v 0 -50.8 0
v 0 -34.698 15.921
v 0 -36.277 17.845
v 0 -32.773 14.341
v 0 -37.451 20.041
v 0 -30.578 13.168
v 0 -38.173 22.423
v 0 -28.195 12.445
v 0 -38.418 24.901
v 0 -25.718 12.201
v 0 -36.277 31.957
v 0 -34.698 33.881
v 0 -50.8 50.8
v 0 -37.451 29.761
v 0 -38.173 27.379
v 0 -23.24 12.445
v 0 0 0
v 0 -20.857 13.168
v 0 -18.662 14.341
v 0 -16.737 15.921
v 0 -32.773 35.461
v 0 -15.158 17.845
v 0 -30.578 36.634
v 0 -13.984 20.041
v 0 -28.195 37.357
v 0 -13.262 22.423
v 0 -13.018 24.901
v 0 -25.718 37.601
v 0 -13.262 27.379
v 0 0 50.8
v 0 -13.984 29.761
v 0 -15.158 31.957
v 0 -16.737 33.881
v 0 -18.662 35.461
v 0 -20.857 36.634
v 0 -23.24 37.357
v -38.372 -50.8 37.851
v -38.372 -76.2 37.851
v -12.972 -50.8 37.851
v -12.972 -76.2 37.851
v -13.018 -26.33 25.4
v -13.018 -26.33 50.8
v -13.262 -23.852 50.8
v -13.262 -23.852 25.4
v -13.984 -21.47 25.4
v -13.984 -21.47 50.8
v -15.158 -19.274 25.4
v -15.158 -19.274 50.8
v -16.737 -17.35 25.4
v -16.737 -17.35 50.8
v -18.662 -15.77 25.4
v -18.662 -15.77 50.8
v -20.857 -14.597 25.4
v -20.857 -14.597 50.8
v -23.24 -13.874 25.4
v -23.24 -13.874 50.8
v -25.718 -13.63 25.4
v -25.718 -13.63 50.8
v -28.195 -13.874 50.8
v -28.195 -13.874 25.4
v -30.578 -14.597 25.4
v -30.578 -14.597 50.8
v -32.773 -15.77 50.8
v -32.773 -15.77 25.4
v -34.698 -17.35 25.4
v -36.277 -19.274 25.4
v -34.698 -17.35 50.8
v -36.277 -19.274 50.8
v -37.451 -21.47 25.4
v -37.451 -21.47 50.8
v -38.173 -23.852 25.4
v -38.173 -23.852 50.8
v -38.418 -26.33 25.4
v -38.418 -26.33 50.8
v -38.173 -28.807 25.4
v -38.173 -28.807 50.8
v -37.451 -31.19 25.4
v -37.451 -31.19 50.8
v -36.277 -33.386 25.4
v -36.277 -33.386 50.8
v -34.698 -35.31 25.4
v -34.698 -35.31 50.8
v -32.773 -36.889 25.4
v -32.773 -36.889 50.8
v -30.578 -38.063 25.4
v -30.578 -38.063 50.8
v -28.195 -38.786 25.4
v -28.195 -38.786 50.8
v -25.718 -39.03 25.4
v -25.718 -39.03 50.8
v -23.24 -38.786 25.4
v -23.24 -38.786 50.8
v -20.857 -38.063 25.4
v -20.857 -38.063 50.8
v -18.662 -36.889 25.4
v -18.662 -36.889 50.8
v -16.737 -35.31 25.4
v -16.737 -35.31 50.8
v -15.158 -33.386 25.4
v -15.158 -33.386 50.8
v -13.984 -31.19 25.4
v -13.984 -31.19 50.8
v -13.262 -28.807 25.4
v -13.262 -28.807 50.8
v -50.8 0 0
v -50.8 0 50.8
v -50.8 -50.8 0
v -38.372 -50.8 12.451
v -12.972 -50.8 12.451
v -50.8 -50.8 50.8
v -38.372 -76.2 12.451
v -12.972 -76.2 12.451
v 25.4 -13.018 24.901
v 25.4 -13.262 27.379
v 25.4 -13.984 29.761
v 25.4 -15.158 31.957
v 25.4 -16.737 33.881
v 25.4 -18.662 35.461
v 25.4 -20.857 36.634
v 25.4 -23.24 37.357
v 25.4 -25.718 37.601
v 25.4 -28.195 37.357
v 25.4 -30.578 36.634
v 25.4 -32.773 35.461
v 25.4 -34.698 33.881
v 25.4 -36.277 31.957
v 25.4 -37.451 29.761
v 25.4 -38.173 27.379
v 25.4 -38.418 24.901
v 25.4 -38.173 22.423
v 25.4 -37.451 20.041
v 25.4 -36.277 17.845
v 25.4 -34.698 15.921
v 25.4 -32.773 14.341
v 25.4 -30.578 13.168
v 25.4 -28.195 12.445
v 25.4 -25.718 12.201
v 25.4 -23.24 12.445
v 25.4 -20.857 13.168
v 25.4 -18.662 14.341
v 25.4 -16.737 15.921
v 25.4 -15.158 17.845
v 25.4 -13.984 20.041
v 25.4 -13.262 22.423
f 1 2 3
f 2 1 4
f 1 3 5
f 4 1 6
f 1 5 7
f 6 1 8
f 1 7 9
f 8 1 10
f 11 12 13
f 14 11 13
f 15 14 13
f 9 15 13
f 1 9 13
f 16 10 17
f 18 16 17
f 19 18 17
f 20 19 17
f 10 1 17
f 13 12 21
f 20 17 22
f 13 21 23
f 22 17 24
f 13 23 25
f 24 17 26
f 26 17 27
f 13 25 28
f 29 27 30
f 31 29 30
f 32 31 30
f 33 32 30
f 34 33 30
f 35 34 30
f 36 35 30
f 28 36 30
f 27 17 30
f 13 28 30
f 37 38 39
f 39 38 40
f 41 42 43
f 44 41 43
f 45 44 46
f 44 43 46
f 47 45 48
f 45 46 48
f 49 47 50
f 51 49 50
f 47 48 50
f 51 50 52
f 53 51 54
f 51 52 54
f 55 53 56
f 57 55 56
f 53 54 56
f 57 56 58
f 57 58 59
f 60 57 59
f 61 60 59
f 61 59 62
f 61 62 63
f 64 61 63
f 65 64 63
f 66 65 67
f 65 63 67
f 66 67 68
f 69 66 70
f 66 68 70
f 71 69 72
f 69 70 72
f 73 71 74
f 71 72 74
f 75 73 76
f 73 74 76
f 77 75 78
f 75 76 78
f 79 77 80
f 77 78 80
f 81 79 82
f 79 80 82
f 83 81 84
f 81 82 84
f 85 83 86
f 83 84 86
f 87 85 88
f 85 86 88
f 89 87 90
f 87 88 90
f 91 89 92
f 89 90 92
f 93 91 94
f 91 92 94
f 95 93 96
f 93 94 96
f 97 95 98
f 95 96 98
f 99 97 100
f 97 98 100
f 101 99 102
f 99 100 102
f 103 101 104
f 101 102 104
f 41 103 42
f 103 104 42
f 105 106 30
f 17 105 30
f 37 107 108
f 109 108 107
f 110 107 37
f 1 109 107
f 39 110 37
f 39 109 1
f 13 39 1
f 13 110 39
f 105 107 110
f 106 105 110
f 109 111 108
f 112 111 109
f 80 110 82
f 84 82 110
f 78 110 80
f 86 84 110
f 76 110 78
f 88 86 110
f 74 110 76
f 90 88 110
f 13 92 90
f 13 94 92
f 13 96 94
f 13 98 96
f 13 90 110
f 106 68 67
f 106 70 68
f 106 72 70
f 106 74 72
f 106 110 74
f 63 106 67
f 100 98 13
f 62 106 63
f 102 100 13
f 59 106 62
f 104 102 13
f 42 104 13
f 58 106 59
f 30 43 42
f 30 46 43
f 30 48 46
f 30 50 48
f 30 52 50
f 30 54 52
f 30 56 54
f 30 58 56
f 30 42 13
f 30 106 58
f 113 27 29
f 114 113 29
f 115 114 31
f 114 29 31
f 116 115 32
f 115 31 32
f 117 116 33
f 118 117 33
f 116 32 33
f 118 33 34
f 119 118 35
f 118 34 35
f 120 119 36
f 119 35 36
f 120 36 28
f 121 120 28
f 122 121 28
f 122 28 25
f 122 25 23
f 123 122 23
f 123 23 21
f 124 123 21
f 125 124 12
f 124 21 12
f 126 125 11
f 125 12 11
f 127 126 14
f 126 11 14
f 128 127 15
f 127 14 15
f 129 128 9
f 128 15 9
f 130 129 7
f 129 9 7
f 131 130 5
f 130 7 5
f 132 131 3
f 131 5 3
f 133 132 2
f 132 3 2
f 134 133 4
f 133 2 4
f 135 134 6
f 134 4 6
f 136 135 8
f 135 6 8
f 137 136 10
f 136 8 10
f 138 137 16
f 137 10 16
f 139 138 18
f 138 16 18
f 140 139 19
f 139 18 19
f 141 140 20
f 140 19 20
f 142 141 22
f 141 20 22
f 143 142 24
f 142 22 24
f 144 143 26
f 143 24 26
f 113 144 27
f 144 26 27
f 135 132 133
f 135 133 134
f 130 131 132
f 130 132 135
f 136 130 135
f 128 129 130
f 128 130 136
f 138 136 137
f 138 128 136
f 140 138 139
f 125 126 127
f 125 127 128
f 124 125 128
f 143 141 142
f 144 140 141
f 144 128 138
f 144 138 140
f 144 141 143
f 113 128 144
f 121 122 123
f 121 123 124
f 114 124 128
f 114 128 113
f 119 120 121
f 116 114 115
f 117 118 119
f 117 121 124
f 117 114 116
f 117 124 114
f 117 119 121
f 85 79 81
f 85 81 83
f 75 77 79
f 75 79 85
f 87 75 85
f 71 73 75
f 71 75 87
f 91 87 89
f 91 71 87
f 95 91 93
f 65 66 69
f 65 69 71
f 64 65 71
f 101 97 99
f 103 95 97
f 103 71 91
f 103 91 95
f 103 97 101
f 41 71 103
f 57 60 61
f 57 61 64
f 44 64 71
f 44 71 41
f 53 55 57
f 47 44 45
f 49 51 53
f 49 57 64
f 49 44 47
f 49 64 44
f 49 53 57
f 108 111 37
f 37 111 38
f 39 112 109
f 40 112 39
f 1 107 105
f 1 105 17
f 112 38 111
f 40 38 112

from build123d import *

# Parameters (mm, degrees)
F0_W      = 50.8
F0_H      = 50.8
F1_DEPTH  = 76.2
F2_DEPTH  = 25.4
F3_R      = 12.7
F4_DEPTH  = 25.4
F5_DEPTH  = 25.4
F6_W      = 25.4
F6_H      = 25.4
F7_DEPTH  = 25.4
F8_DEPTH  = 25.4
F9_DEPTH  = 25.4
F10_R     = 12.7
F11_DEPTH = 25.4


with BuildPart() as f1:
    # F0 (on Front) → F1 (new body)
    with BuildSketch(Plane.XZ):
        with Locations((-25.4, 25.4)):
            Rectangle(F0_W, F0_H)
    extrude(amount=F1_DEPTH)

    # F2 (cut): a face of the model
    f2_faces = [f1.faces().sort_by_distance(p)[0] for p in [
        (-25.4, -76.2, 25.4),
    ]]
    extrude(f2_faces, amount=-F2_DEPTH, mode=Mode.SUBTRACT)

    # F3 (on face) → F4 (cut)
    with BuildSketch(Plane.XY.offset(50.8)):
        with Locations((-25.7175005972, -26.3298209757)):
            Circle(F3_R)
    extrude(amount=-F4_DEPTH, mode=Mode.SUBTRACT)

    # F5 (add): a face of the model
    f5_faces = [f1.faces().sort_by_distance(p)[0] for p in [
        (-25.4, -50.8, 25.4),
    ]]
    extrude(f5_faces, amount=F5_DEPTH)

    # F6 (on face) → F7 (join)
    with BuildSketch(Plane.XZ.offset(76.2)):
        with Locations((-25.6721441031, 25.1505357817)):
            Rectangle(F6_W, F6_H)
    extrude(amount=F7_DEPTH)

    # F8 (cut): a face of the model
    f8_faces = [f1.faces().sort_by_distance(p)[0] for p in [
        (-25.4, -76.2, 0.7184204897),
    ]]
    extrude(f8_faces, amount=-F8_DEPTH, mode=Mode.SUBTRACT)

    # F9 (cut): a face of the model
    f9_faces = [f1.faces().sort_by_distance(p)[0] for p in [
        (-25.6721441031, -101.6, 25.1505357817),
    ]]
    extrude(f9_faces, amount=-F9_DEPTH, mode=Mode.SUBTRACT)

    # F10 (on face) → F11 (join)
    with BuildSketch(Plane.YZ):
        with Locations((-25.7175005972, 24.9010715634)):
            Circle(F10_R)
    extrude(amount=F11_DEPTH)


solid = f1.part
